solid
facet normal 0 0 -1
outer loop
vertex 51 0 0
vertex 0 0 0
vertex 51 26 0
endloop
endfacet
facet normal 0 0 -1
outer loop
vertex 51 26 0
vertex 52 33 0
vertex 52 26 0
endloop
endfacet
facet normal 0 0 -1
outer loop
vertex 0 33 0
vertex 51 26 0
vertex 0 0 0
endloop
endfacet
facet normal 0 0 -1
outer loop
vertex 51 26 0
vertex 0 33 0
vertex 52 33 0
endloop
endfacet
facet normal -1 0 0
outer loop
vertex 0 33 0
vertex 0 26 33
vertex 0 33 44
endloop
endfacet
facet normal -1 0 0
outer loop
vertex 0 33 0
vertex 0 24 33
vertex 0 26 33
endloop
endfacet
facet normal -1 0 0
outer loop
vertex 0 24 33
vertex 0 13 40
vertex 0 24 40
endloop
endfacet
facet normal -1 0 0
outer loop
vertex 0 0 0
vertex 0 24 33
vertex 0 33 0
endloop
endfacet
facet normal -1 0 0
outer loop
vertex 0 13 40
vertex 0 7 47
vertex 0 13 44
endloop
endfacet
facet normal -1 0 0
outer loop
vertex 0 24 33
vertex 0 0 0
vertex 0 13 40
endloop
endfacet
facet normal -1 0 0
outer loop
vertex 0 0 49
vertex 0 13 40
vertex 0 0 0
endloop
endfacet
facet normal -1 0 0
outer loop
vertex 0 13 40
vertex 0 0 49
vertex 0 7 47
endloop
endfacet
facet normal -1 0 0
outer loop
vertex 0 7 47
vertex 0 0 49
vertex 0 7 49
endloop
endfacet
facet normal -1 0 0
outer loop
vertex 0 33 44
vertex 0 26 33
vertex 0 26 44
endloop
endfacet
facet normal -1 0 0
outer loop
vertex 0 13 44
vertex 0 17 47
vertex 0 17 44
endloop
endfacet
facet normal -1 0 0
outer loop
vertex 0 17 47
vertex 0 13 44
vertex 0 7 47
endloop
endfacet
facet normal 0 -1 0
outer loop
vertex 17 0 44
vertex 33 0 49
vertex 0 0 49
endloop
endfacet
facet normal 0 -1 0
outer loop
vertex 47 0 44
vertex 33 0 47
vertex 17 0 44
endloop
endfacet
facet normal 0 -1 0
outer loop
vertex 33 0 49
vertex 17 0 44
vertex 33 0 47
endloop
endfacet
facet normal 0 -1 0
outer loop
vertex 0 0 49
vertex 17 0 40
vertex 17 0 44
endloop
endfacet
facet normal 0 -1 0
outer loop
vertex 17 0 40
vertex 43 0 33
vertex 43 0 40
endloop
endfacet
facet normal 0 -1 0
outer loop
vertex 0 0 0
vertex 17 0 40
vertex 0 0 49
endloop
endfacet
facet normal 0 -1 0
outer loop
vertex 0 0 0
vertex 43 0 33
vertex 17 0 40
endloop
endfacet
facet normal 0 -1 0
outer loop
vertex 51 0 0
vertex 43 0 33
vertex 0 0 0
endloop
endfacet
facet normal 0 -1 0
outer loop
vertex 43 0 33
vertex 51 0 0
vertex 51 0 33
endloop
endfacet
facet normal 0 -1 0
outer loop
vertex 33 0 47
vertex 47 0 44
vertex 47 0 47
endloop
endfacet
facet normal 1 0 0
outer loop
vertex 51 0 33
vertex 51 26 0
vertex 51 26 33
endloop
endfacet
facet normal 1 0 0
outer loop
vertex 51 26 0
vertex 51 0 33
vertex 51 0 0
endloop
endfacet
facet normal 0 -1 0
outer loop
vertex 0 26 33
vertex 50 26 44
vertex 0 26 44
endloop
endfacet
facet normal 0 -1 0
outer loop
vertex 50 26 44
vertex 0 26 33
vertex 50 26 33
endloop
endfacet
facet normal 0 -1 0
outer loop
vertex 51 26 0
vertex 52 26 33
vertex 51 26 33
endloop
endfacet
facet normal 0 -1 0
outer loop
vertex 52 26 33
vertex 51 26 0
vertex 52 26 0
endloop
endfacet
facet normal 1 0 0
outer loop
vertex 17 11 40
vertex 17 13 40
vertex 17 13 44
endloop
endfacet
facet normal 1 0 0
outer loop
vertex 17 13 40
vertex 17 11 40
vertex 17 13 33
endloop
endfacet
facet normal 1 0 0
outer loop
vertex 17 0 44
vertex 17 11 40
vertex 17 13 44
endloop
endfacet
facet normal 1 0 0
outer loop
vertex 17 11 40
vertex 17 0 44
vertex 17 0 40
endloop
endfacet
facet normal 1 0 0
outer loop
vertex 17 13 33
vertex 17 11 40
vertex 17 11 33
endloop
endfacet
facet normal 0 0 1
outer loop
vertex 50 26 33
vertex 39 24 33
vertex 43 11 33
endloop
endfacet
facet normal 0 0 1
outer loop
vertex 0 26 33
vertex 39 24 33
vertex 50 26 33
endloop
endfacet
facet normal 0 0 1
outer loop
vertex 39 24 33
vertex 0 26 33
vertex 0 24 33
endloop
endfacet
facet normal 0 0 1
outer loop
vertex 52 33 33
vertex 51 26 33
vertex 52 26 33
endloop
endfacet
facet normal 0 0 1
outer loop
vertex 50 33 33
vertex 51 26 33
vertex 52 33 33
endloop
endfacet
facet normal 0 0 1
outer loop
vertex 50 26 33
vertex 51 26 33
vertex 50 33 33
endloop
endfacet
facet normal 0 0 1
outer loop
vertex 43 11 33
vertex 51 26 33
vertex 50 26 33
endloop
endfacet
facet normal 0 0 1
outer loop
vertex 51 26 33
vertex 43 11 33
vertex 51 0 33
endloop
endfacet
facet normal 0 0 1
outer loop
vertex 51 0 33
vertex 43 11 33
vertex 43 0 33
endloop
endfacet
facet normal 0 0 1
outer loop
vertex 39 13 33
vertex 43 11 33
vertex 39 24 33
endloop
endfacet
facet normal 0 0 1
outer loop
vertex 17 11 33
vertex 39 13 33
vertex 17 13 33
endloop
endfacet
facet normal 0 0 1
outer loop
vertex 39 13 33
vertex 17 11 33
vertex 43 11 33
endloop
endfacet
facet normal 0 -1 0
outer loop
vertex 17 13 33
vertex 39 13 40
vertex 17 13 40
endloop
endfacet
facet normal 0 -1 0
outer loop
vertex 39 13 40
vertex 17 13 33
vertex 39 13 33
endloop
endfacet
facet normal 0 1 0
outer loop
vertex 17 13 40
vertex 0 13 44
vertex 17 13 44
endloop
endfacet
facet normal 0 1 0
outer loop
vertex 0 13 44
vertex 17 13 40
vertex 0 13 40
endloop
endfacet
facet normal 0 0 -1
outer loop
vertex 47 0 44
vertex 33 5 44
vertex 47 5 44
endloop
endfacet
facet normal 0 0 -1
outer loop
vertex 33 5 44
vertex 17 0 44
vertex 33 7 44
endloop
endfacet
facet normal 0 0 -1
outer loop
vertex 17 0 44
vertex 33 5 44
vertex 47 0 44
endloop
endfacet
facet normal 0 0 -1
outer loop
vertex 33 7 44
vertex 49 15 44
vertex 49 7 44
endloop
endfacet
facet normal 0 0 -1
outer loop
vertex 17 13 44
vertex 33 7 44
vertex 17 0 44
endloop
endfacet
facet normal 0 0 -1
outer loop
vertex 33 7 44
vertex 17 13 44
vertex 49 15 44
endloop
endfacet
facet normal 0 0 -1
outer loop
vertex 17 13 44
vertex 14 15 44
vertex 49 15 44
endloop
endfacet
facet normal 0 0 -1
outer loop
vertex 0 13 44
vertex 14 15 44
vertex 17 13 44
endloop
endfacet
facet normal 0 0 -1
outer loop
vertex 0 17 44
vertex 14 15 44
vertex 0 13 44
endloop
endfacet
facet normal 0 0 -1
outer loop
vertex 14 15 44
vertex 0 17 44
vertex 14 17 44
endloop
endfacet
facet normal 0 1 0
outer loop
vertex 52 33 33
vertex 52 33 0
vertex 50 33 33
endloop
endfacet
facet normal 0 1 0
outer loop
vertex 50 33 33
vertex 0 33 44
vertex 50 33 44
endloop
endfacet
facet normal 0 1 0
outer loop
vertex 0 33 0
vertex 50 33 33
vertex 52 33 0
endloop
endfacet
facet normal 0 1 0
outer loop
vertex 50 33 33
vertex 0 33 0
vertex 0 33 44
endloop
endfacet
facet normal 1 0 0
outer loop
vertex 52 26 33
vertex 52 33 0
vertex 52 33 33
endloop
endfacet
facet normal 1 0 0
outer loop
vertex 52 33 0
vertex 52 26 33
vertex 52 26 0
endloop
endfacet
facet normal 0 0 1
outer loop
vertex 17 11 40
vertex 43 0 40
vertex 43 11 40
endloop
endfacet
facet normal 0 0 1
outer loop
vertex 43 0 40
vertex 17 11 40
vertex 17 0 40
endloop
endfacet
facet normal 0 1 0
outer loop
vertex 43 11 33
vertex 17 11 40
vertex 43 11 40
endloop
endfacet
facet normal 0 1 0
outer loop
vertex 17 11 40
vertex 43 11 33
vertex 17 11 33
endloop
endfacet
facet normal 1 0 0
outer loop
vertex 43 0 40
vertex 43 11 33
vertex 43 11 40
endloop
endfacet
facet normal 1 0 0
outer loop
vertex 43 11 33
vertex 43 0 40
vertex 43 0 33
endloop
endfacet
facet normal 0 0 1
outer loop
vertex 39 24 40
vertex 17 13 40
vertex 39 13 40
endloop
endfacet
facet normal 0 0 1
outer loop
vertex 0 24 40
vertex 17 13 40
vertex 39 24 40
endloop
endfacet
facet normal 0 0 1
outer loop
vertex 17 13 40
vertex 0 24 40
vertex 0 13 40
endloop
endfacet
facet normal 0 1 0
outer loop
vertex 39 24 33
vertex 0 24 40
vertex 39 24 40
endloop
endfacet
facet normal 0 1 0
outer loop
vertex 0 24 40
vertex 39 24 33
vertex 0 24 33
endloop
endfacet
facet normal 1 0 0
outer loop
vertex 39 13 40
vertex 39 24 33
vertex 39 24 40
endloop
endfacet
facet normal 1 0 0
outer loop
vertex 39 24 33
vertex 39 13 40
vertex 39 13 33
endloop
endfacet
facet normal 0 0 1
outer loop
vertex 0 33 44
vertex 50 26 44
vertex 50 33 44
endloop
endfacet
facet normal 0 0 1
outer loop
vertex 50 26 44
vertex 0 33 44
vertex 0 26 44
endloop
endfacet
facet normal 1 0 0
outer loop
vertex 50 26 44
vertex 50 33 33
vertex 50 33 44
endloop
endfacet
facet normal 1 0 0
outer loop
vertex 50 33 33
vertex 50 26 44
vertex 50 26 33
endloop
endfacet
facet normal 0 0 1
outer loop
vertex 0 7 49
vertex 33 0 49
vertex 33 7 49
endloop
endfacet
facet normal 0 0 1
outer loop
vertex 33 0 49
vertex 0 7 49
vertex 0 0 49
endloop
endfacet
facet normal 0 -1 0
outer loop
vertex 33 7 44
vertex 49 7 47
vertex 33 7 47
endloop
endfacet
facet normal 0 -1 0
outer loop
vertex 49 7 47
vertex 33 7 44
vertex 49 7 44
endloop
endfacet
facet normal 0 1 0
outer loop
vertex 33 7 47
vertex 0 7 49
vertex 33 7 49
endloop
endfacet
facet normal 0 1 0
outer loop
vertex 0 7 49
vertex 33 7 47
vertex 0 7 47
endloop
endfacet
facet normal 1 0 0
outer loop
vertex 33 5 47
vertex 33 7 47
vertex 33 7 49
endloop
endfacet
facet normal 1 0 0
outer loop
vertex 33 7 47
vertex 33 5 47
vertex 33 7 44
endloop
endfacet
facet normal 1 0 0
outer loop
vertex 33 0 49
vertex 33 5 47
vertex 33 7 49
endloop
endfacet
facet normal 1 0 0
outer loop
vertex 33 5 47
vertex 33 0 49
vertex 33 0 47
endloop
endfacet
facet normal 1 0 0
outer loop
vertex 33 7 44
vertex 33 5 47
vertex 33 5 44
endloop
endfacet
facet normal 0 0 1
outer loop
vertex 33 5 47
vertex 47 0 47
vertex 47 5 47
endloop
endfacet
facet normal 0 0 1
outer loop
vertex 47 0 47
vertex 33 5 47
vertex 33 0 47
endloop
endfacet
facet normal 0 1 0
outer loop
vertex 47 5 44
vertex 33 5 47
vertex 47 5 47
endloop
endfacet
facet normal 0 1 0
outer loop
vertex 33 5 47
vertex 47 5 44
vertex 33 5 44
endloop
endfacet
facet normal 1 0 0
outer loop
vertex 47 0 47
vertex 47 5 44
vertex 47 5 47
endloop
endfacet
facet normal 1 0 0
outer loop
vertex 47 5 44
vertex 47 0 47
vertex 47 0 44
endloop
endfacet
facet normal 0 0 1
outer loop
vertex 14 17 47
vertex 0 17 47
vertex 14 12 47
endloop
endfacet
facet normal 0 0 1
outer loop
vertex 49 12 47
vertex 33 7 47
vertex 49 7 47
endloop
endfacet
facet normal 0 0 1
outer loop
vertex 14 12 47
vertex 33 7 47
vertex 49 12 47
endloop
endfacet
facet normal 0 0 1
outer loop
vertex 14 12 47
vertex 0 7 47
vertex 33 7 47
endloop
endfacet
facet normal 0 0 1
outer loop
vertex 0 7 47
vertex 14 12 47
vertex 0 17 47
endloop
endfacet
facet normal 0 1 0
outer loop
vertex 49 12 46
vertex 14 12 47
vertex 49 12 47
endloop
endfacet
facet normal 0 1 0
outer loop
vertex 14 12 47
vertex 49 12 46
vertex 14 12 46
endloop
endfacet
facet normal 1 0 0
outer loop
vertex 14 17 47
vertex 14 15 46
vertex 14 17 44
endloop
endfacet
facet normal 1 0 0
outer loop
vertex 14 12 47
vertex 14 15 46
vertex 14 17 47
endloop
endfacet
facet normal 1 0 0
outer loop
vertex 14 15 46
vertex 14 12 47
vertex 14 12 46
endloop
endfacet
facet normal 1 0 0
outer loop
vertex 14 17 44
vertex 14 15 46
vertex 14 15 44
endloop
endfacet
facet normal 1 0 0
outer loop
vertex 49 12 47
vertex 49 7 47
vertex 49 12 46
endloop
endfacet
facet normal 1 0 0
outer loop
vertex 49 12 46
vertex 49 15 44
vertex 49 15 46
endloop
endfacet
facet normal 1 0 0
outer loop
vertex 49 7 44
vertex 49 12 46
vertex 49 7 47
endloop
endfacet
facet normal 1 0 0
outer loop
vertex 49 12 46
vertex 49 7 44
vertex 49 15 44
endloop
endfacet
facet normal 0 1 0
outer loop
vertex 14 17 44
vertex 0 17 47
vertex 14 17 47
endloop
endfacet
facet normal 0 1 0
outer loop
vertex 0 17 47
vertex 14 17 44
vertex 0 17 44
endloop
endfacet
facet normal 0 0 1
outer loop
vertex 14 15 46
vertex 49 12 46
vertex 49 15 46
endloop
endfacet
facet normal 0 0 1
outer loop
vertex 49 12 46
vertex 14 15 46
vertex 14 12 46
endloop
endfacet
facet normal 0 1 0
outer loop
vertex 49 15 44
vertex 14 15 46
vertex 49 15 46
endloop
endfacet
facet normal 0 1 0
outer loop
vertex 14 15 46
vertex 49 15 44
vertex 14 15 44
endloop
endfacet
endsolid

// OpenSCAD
translate([8.5, 6.5, 5.5]) color([0.7049921609492721, 0.9580042227229432, 0.16448599428307875]) cube([17, 13, 11], center=true);
translate([25.5, 6.5, 5.5]) color([0.9235592861863212, 0.9279862525071727, 0.6347489386405218]) cube([17, 13, 11], center=true);
translate([42.5, 6.5, 5.5]) color([0.9403908272970672, 0.25268558738542024, 0.8817872834036474]) cube([17, 13, 11], center=true);
translate([8.5, 19.5, 5.5]) color([0.7734792929601902, 0.6096889997106941, 0.09062924464806255]) cube([17, 13, 11], center=true);
translate([25.5, 19.5, 5.5]) color([0.030134353730962182, 0.01096949549411852, 0.2505580574481764]) cube([17, 13, 11], center=true);
translate([42.5, 19.5, 5.5]) color([0.7623524099431817, 0.3866250323922331, 0.7754467251552132]) cube([17, 13, 11], center=true);
translate([8.5, 6.5, 16.5]) color([0.6256424909314248, 0.3892618991218443, 0.8801466287862422]) cube([17, 13, 11], center=true);
translate([25.5, 6.5, 16.5]) color([0.03841723935819574, 0.465312990207844, 0.8298523393928158]) cube([17, 13, 11], center=true);
translate([42.5, 6.5, 16.5]) color([0.12681348297309336, 0.7104875615116192, 0.32811584191028165]) cube([17, 13, 11], center=true);
translate([8.5, 19.5, 16.5]) color([0.02430127857694553, 0.4737249308893109, 0.521692738945335]) cube([17, 13, 11], center=true);
translate([25.5, 19.5, 16.5]) color([0.04158625067384558, 0.5659193535517807, 0.34743383795783944]) cube([17, 13, 11], center=true);
translate([42.5, 19.5, 16.5]) color([0.004493207256296983, 0.19077338067656535, 0.11081067227867492]) cube([17, 13, 11], center=true);
translate([8.5, 6.5, 27.5]) color([0.5406219547324049, 0.043120163042338455, 0.9281325700980793]) cube([17, 13, 11], center=true);
translate([25.5, 6.5, 27.5]) color([0.8450619723983726, 0.9452976437314561, 0.31480103278643345]) cube([17, 13, 11], center=true);
translate([42.5, 6.5, 27.5]) color([0.9052673885618943, 0.984312422520035, 0.7647314342526466]) cube([17, 13, 11], center=true);
translate([8.5, 19.5, 27.5]) color([0.2750826135755835, 0.6708893041471536, 0.5956631537339799]) cube([17, 13, 11], center=true);
translate([25.5, 19.5, 27.5]) color([0.40420330216444333, 0.3060978540144266, 0.059848190567730275]) cube([17, 13, 11], center=true);
translate([42.5, 19.5, 27.5]) color([0.12538247475645914, 0.13395615600511968, 0.48089286465431025]) cube([17, 13, 11], center=true);
translate([8.5, 6.5, 38.5]) color([0.6418933847268948, 0.7640684524444807, 0.046713759972221824]) cube([17, 13, 11], center=true);
translate([6.5, 29.5, 5.5]) color([0.8237598726124178, 0.04347122329095843, 0.5549468300580123]) cube([13, 7, 11], center=true);
translate([19.5, 29.5, 5.5]) color([0.7441478498080107, 0.631221371794228, 0.949678675683002]) cube([13, 7, 11], center=true);
translate([32.5, 29.5, 5.5]) color([0.3446983531128357, 0.5858833552375392, 0.08279906273431636]) cube([13, 7, 11], center=true);
translate([45.5, 29.5, 5.5]) color([0.5597965879322987, 0.8132988010762888, 0.20160451382548072]) cube([13, 7, 11], center=true);
translate([6.5, 29.5, 16.5]) color([0.26096450036718066, 0.7004056402196938, 0.25388196693606324]) cube([13, 7, 11], center=true);
translate([19.5, 29.5, 16.5]) color([0.25924547402140496, 0.9355152879393015, 0.9985430308431146]) cube([13, 7, 11], center=true);
translate([32.5, 29.5, 16.5]) color([0.15519843069219807, 0.9001623872580004, 0.552726485973739]) cube([13, 7, 11], center=true);
translate([45.5, 29.5, 16.5]) color([0.038601142410517486, 0.5855027152371853, 0.641549650670755]) cube([13, 7, 11], center=true);
translate([6.5, 29.5, 27.5]) color([0.0337956987021093, 0.7576919221586004, 0.817800141474185]) cube([13, 7, 11], center=true);
translate([19.5, 29.5, 27.5]) color([0.07164324218695617, 0.6483999400661788, 0.4565474809027662]) cube([13, 7, 11], center=true);
translate([32.5, 29.5, 27.5]) color([0.2387212873419211, 0.4586703816224843, 0.15938970975228217]) cube([13, 7, 11], center=true);
translate([45.5, 29.5, 27.5]) color([0.33366590673229635, 0.6552072997009475, 0.4764855561518734]) cube([13, 7, 11], center=true);
translate([23.5, 5.5, 36.5]) color([0.5559200946775417, 0.5434427938045303, 0.8205942401116392]) cube([13, 11, 7], center=true);
translate([36.5, 5.5, 36.5]) color([0.3433827981536126, 0.8129620907818157, 0.07998708713040747]) cube([13, 11, 7], center=true);
translate([6.5, 18.5, 36.5]) color([0.4277330458726053, 0.352320116536872, 0.451580638705249]) cube([13, 11, 7], center=true);
translate([19.5, 18.5, 36.5]) color([0.8335098205362665, 0.5123994004879511, 0.9872466462948367]) cube([13, 11, 7], center=true);
translate([32.5, 18.5, 36.5]) color([0.8614607202751068, 0.11884674531302208, 0.3168915355616677]) cube([13, 11, 7], center=true);
translate([2.5, 29.5, 38.5]) color([0.022725501526886682, 0.7337534213446073, 0.019200804366837798]) cube([5, 7, 11], center=true);
translate([7.5, 29.5, 38.5]) color([0.8859385148247924, 0.19334286484226215, 0.4138362902804684]) cube([5, 7, 11], center=true);
translate([12.5, 29.5, 38.5]) color([0.06203930600614804, 0.3112548872587563, 0.3895149894928328]) cube([5, 7, 11], center=true);
translate([17.5, 29.5, 38.5]) color([0.052230973545080106, 0.7675506531778632, 0.7113497195255859]) cube([5, 7, 11], center=true);
translate([22.5, 29.5, 38.5]) color([0.35788362412452357, 0.835192553154071, 0.07742180234362261]) cube([5, 7, 11], center=true);
translate([27.5, 29.5, 38.5]) color([0.05400640100767218, 0.35498029443727297, 0.9018413321683949]) cube([5, 7, 11], center=true);
translate([32.5, 29.5, 38.5]) color([0.7564677019106462, 0.6723176785539303, 0.5627357352457344]) cube([5, 7, 11], center=true);
translate([37.5, 29.5, 38.5]) color([0.80376553873448, 0.41222669318814775, 0.030688579780824843]) cube([5, 7, 11], center=true);
translate([42.5, 29.5, 38.5]) color([0.8024042864453003, 0.1904934342897321, 0.3876588498360868]) cube([5, 7, 11], center=true);
translate([47.5, 29.5, 38.5]) color([0.3576093472265096, 0.12336562593420342, 0.3507843689720118]) cube([5, 7, 11], center=true);
translate([5.5, 3.5, 46.5]) color([0.17708687785091481, 0.6160138300848896, 0.6534343577697814]) cube([11, 7, 5], center=true);
translate([16.5, 3.5, 46.5]) color([0.013646552881622753, 0.45647585236099164, 0.5540526564867162]) cube([11, 7, 5], center=true);
translate([27.5, 3.5, 46.5]) color([0.8716629944357835, 0.49603131023446156, 0.08045043690485232]) cube([11, 7, 5], center=true);
translate([36.5, 2.5, 45.5]) color([0.051723879096013836, 0.8621090829516437, 0.7907294093349121]) cube([7, 5, 3], center=true);
translate([43.5, 2.5, 45.5]) color([0.8584479311516113, 0.262242667584096, 0.6479973607947307]) cube([7, 5, 3], center=true);
translate([3.5, 9.5, 45.5]) color([0.09571804729550981, 0.8265731117136212, 0.33361293642632384]) cube([7, 5, 3], center=true);
translate([10.5, 9.5, 45.5]) color([0.9551472373193942, 0.4713825655590471, 0.0330676969459045]) cube([7, 5, 3], center=true);
translate([17.5, 9.5, 45.5]) color([0.909055877600589, 0.6255321488137767, 0.2870812860118641]) cube([7, 5, 3], center=true);
translate([24.5, 9.5, 45.5]) color([0.03680389375035842, 0.37668639673062454, 0.15686055976460878]) cube([7, 5, 3], center=true);
translate([31.5, 9.5, 45.5]) color([0.5482803113458813, 0.14688367516218315, 0.1746142788181122]) cube([7, 5, 3], center=true);
translate([38.5, 9.5, 45.5]) color([0.920869485728258, 0.6401200345146435, 0.24258141177262083]) cube([7, 5, 3], center=true);
translate([45.5, 9.5, 45.5]) color([0.8788962806324696, 0.6247158298512584, 0.9455993400800832]) cube([7, 5, 3], center=true);
translate([3.5, 14.5, 45.5]) color([0.4829167944087076, 0.8879008339780402, 0.678443807349386]) cube([7, 5, 3], center=true);
translate([10.5, 14.5, 45.5]) color([0.04416855593342761, 0.24029049005859915, 0.2815764049334011]) cube([7, 5, 3], center=true);
translate([16.5, 13.5, 45.0]) color([0.17001668338644926, 0.23818695062460127, 0.22604014846400422]) cube([5, 3, 2], center=true);
translate([21.5, 13.5, 45.0]) color([0.8783437492009086, 0.4628987935430291, 0.8765118313236592]) cube([5, 3, 2], center=true);
translate([26.5, 13.5, 45.0]) color([0.1379978834577653, 0.5649184865561083, 0.013467678145623552]) cube([5, 3, 2], center=true);
translate([31.5, 13.5, 45.0]) color([0.9303014098379871, 0.005637114397734955, 0.3899076485519639]) cube([5, 3, 2], center=true);
translate([36.5, 13.5, 45.0]) color([0.8015859586891702, 0.9998815592294843, 0.019509740361318695]) cube([5, 3, 2], center=true);
translate([41.5, 13.5, 45.0]) color([0.8240854838738103, 0.510087959495908, 0.038182020539084705]) cube([5, 3, 2], center=true);
translate([46.5, 13.5, 45.0]) color([0.7771192709025531, 0.11190241257102229, 0.6114741872824333]) cube([5, 3, 2], center=true);
